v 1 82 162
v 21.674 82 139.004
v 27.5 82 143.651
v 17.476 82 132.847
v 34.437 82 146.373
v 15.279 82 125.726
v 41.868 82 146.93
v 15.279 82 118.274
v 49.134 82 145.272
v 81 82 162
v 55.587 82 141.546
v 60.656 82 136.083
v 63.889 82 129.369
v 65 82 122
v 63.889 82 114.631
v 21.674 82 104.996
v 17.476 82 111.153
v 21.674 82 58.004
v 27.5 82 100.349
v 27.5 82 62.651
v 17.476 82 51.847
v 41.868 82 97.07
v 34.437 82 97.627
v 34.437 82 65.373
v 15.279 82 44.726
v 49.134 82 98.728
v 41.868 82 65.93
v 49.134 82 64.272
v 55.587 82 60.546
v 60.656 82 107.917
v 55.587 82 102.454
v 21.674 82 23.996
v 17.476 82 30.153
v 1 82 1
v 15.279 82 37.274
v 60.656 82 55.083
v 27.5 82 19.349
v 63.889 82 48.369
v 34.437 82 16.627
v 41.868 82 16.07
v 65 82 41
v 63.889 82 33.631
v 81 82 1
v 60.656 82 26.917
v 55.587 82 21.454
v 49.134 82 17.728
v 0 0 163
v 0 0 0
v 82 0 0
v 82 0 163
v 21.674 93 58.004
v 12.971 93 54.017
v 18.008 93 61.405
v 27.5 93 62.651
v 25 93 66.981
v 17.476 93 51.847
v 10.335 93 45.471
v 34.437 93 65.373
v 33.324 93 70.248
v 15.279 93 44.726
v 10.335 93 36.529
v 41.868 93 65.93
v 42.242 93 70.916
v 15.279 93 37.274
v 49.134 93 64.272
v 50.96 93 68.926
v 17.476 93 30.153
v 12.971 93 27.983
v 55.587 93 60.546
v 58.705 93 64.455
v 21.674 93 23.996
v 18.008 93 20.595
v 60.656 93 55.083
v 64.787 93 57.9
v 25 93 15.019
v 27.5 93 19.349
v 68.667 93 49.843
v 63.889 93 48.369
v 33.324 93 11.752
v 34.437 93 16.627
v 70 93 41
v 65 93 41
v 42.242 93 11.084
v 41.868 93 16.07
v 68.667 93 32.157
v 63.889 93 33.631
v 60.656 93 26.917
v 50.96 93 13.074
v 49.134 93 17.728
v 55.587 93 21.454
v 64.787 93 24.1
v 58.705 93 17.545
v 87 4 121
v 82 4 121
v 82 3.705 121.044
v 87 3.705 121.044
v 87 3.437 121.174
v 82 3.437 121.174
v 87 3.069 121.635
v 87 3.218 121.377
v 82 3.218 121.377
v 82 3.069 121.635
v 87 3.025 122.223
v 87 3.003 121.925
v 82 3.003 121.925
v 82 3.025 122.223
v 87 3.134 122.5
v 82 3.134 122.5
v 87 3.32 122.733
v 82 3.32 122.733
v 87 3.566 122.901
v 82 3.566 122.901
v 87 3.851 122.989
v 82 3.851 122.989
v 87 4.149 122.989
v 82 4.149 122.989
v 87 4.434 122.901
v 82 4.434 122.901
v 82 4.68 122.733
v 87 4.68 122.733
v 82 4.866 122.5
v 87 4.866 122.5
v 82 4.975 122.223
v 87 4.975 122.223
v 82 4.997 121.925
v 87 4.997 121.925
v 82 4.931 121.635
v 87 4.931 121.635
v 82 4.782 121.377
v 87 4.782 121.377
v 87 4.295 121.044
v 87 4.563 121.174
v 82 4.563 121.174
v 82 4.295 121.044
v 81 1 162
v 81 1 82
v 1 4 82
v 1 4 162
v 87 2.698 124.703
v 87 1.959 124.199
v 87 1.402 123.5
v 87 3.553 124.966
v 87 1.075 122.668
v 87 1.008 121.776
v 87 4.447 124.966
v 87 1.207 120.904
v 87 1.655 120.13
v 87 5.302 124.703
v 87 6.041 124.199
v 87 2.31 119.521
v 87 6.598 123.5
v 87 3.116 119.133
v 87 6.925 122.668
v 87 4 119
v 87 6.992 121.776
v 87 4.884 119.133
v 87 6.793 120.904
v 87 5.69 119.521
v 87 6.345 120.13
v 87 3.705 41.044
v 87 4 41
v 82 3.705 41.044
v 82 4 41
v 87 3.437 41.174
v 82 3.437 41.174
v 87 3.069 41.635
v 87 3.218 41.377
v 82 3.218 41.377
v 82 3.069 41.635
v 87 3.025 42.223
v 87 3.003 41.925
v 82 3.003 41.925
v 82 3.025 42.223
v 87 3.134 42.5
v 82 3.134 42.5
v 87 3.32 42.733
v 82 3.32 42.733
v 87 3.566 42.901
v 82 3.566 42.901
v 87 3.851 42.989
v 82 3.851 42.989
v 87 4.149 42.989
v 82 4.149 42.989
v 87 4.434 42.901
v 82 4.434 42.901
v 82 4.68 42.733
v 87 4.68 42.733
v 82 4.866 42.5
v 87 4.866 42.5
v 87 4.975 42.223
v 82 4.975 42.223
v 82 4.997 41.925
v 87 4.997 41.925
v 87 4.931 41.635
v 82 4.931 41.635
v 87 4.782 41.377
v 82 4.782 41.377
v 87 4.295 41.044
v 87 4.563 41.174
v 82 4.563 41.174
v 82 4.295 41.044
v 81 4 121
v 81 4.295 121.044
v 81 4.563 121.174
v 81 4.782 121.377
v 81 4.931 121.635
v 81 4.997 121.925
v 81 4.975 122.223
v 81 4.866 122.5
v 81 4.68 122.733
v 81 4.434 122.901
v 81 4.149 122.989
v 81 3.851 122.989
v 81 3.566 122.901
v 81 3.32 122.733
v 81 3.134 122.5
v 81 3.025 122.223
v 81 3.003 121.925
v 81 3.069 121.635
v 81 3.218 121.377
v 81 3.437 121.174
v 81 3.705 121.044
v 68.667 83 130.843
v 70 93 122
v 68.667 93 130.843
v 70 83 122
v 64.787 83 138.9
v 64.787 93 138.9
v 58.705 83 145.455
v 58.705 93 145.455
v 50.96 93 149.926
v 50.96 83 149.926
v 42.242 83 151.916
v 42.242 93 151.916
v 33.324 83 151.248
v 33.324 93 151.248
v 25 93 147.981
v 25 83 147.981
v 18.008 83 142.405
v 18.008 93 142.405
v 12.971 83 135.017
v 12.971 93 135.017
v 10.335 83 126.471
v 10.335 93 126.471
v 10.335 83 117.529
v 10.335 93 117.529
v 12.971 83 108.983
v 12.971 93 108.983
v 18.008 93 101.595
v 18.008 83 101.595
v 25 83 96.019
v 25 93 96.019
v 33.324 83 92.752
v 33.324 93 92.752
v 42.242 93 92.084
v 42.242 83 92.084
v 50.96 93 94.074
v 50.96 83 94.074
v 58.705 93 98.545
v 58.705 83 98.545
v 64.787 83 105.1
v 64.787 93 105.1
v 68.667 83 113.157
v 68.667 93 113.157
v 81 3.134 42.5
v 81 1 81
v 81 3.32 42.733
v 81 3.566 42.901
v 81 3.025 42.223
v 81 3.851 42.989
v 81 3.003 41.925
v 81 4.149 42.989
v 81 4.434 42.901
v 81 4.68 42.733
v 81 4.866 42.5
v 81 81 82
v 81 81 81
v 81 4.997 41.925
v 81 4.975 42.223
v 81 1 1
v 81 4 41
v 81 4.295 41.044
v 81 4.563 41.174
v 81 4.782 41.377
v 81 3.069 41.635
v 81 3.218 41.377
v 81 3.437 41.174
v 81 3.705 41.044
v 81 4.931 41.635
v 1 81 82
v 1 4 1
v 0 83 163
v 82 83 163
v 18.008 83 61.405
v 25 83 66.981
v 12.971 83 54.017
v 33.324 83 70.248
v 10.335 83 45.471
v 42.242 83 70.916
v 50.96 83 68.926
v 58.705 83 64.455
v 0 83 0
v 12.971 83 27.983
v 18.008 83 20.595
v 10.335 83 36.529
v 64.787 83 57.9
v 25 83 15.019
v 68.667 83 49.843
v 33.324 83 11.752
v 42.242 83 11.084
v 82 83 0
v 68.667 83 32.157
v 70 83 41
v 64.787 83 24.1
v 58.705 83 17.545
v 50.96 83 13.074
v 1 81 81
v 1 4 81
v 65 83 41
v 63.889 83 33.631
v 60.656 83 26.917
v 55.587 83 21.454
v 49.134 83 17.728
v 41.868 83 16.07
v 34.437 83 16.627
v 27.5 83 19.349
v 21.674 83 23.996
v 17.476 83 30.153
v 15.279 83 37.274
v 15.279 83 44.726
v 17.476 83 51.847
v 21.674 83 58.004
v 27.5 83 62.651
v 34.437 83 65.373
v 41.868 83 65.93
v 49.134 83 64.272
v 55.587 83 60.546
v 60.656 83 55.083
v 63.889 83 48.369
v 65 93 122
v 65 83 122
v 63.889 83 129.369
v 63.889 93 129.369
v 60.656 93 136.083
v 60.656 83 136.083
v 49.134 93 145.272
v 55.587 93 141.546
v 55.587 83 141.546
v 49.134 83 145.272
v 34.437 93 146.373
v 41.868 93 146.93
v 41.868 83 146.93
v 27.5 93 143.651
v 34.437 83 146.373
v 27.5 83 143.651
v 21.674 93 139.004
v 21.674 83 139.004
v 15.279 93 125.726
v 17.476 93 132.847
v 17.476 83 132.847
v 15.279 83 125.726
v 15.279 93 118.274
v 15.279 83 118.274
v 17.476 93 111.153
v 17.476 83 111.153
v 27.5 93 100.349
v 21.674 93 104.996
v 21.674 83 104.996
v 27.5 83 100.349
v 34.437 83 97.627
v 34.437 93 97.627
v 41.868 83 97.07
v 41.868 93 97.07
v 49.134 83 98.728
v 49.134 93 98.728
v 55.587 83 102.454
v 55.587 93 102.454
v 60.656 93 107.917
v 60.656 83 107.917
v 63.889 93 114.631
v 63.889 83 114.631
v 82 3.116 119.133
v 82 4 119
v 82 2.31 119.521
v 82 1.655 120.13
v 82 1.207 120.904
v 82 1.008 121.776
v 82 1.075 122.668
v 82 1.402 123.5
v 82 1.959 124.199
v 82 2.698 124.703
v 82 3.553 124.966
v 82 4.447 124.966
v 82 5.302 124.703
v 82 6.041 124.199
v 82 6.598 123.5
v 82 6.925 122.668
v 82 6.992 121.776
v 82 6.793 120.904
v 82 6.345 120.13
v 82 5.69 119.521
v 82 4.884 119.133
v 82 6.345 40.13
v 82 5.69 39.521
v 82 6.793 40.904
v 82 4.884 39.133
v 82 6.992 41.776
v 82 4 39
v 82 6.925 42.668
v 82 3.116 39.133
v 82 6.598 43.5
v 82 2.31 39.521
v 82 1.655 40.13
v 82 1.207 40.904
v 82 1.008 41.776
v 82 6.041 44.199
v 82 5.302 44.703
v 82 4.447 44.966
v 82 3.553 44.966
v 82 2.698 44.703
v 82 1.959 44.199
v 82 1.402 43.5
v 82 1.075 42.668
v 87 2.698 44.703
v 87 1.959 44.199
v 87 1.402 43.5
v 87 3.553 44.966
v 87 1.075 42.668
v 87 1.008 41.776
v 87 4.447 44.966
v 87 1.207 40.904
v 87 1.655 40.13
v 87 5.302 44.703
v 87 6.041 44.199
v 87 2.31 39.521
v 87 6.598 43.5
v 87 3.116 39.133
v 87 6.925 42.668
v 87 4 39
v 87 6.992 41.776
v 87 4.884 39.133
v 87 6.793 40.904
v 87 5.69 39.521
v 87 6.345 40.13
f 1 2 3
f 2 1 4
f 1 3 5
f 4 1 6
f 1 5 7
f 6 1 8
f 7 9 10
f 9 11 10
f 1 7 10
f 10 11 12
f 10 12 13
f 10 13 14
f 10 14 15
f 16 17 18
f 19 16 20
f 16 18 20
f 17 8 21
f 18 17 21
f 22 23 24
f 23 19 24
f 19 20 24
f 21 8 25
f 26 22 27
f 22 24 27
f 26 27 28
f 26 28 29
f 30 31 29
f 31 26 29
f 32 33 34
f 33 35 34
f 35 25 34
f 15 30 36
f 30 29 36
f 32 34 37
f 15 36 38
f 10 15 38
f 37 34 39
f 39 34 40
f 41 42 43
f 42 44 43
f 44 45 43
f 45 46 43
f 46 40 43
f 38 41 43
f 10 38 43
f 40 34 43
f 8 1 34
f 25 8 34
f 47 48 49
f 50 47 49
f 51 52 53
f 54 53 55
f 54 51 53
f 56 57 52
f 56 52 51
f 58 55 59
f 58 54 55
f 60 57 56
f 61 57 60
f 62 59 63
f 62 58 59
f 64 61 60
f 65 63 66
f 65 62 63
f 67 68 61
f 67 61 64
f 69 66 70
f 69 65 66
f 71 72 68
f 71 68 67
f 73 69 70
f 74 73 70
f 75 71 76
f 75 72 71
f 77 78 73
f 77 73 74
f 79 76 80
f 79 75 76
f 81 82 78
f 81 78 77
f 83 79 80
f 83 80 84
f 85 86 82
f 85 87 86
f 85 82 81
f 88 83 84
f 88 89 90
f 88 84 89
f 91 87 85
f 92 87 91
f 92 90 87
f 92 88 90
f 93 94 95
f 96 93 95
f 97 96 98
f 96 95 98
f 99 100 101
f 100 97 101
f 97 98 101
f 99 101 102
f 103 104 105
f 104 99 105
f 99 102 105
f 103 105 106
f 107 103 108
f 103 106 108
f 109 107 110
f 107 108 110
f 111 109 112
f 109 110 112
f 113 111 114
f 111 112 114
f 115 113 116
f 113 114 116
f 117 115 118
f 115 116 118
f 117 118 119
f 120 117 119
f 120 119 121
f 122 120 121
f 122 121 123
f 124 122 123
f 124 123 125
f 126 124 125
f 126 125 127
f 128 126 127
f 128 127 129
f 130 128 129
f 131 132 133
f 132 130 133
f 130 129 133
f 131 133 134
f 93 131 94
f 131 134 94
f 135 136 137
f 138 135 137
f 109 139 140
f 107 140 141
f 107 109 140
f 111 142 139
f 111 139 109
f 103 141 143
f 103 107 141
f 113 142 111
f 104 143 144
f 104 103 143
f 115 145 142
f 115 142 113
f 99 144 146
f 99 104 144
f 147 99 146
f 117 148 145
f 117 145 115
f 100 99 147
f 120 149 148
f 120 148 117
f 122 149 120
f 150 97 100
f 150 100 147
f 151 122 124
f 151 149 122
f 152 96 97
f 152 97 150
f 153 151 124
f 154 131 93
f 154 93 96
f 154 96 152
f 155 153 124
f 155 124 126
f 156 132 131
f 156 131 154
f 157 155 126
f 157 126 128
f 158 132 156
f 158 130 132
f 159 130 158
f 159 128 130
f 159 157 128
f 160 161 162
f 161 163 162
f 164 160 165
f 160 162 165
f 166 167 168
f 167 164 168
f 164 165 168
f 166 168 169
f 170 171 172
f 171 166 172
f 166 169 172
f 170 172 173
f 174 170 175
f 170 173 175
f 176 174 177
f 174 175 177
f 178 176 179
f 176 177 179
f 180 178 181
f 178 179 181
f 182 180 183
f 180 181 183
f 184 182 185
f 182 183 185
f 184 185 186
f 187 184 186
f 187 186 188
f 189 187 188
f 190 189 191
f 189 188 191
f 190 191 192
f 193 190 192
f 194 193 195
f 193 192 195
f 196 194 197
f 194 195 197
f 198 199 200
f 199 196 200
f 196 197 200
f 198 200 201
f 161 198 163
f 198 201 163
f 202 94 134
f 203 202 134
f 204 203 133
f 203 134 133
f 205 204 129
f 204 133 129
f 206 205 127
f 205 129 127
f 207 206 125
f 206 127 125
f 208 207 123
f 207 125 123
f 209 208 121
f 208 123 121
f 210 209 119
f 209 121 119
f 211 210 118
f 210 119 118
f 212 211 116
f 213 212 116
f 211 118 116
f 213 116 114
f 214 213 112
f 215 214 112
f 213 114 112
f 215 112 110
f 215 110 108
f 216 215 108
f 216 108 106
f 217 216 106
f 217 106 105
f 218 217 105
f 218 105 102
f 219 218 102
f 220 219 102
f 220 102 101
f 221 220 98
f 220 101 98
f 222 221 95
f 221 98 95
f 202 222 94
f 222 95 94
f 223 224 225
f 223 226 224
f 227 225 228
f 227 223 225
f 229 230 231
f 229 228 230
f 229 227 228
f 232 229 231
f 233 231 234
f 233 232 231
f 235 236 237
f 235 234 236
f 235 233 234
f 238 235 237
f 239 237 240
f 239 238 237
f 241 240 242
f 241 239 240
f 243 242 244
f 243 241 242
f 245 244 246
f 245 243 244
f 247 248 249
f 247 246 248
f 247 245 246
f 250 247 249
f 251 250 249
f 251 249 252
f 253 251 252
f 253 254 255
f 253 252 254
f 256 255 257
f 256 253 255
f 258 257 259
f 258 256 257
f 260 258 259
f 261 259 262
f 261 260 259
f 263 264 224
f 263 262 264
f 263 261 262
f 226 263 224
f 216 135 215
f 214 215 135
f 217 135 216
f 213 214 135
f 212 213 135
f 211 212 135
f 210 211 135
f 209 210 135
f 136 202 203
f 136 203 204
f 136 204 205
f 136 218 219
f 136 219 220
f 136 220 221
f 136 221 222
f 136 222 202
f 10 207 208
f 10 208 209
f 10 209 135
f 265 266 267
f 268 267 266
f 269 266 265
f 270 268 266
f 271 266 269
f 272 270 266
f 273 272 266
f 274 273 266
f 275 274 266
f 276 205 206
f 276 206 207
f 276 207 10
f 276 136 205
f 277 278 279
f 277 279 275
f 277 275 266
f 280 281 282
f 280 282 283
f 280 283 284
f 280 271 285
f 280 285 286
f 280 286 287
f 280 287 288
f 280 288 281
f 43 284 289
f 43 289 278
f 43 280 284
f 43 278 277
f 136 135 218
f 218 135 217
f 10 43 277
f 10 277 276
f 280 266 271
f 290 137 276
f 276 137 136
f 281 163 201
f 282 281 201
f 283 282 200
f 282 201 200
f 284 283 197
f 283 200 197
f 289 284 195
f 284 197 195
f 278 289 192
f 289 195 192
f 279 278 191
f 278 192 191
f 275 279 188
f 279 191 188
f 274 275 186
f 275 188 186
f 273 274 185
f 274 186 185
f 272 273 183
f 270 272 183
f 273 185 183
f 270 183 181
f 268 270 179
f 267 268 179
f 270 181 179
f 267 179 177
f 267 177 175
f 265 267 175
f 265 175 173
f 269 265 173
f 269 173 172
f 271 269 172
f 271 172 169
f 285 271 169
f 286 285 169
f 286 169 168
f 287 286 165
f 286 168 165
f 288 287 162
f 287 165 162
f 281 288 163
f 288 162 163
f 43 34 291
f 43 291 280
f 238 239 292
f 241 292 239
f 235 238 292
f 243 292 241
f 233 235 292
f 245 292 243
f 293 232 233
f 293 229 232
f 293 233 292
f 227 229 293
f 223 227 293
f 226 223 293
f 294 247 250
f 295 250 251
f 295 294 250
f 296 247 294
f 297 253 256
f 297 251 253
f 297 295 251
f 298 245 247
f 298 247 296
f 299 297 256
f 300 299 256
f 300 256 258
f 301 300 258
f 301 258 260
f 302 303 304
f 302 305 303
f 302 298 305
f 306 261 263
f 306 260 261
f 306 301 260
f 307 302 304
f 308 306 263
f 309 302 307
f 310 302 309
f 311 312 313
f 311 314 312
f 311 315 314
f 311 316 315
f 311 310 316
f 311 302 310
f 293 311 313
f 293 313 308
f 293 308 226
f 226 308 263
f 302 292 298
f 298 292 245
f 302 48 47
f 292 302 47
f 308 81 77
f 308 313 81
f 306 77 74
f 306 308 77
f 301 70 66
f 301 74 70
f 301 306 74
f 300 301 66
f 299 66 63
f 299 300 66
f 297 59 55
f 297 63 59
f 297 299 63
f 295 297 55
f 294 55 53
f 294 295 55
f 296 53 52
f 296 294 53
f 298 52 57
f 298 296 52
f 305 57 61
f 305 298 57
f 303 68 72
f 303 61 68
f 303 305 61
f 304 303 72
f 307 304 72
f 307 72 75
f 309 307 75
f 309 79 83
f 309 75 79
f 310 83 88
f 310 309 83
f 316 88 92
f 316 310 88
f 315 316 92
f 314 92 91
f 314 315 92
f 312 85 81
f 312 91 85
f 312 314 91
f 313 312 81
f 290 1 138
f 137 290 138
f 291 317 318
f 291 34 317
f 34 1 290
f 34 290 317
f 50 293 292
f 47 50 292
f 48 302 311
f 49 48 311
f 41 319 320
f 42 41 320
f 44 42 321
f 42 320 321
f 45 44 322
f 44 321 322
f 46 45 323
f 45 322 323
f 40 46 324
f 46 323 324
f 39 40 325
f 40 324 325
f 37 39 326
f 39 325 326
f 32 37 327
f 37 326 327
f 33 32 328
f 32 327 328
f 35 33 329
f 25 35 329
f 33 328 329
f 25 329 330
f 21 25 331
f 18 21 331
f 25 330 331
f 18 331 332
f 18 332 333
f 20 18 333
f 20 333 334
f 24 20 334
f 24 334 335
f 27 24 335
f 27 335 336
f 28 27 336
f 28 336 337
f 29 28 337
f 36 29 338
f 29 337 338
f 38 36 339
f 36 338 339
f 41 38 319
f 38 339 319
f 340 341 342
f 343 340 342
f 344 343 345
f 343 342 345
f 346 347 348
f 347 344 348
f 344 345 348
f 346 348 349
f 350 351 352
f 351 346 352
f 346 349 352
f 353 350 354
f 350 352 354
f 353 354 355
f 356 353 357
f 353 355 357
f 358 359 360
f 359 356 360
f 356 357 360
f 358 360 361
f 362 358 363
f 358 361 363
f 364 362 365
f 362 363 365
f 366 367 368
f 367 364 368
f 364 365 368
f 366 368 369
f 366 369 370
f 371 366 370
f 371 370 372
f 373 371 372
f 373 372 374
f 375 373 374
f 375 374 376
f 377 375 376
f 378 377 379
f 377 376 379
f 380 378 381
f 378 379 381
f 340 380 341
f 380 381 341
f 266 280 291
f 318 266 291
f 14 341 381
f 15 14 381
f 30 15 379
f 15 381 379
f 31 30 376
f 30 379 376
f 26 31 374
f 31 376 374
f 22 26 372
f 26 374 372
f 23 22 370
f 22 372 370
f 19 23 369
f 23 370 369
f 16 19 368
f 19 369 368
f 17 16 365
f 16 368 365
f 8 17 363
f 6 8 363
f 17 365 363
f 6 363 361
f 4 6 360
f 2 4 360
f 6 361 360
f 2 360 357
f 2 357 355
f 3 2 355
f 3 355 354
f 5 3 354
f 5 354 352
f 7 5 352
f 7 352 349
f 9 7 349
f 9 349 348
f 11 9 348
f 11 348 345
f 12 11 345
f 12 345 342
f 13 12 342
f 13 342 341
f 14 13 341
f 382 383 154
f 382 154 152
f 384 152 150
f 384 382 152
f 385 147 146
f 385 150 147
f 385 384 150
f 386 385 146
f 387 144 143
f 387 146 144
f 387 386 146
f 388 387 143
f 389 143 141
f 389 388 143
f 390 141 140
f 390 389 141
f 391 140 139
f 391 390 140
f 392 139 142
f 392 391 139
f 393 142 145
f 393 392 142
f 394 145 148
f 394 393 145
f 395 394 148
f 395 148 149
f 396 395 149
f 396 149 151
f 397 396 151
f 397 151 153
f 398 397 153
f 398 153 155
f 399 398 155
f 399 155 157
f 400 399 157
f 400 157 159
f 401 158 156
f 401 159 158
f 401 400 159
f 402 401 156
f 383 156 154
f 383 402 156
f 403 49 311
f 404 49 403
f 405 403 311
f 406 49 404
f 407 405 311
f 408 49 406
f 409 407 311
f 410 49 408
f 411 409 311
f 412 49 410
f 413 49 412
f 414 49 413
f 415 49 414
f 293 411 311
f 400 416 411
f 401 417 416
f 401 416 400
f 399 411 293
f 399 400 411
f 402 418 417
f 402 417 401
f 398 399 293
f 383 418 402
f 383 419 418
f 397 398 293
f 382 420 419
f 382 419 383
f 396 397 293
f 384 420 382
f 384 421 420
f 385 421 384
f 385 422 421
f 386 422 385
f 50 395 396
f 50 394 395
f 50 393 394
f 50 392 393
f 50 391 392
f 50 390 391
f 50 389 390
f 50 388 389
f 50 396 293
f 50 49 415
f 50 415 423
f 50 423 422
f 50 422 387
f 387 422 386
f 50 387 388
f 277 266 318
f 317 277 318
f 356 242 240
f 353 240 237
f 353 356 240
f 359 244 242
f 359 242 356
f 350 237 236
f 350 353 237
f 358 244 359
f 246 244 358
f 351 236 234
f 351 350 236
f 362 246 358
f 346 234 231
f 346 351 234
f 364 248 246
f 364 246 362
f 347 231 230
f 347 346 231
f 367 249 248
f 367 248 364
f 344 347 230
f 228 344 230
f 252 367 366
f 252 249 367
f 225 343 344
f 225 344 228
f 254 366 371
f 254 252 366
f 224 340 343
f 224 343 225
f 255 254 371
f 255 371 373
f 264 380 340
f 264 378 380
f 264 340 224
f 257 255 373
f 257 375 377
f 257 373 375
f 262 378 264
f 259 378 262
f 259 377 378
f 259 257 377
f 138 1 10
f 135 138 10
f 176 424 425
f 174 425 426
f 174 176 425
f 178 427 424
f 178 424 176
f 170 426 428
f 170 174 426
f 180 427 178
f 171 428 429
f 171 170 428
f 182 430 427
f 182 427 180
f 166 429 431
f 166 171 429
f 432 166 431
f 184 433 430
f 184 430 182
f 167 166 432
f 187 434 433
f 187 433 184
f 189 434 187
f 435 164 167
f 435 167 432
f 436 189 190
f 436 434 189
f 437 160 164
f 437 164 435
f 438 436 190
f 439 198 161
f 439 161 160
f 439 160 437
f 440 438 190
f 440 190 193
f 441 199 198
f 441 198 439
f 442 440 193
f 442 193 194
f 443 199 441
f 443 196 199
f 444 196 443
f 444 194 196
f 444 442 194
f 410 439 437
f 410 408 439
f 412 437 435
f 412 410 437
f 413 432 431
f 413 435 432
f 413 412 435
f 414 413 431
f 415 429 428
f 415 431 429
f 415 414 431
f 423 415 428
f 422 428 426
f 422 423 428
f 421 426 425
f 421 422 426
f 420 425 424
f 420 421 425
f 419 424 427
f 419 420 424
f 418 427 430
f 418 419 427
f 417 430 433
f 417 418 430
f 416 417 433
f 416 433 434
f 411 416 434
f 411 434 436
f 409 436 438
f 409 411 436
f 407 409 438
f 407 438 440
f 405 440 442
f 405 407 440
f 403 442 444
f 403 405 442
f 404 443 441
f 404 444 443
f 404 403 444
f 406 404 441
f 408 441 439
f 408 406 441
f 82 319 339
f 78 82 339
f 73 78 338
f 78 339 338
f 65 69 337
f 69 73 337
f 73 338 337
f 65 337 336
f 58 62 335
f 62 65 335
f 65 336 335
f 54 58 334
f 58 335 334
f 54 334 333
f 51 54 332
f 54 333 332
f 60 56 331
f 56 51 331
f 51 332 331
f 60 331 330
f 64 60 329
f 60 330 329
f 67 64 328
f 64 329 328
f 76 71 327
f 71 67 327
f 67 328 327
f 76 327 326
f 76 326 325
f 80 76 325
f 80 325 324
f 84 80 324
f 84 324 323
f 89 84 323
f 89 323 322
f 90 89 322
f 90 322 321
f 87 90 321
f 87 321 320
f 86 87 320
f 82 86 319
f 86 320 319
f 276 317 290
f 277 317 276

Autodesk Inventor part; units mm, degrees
ref_plane "YZ Plane" through (0, 0, 0) normal (1, 0, 0) x (0, 1, 0)
ref_plane "XZ Plane" through (0, 0, 0) normal (0, 1, 0) x (-1, 0, 0)
ref_plane "XY Plane" through (0, 0, 0) normal (0, 0, 1) x (1, 0, 0)
sketch "Sketch1" plane through (0, 0, 0) normal (0, 0, 1) x (1, 0, 0)
  line L0 (0, 0) -> (82, 0)
  line L1 (82, 0) -> (82, 82)
  line L2 (82, 82) -> (0, 82)
  line L3 (0, 82) -> (0, 0)
  dimension "d0" = 82
  dimension "d1" = 82
extrude "Extrusion1" add sketch "Sketch1" along normal blind 163
shell "Shell1" thickness 1 removed faces 1 at (54.6667, 82, 54.3333)
sketch "Sketch6" plane through (82, 0, 0) normal (1, 0, 0) x (0, 0, -1)
  circle A0 centre (-122, 4) radius 1
  circle A1 centre (-122, 4) radius 3
  line L0 (0, 0) -> (0, 82) projected
  line L1 (0, 0) -> (-163, 0) projected
  line L2 (-163, 0) -> (-163, 82) projected
  dimension "d18" = 2
  dimension "d19" = 2
  dimension "d21" = 4
  dimension "d50" = 41
extrude "Extrusion5" add sketch "Sketch6" along normal blind 5
thread "Thread1" size "M6x1" class "6g" standard "ANSI Metric M Profile" length 7.15
sketch "Sketch7" plane through (82, 4, 122) normal (1, 0, 0) x (0, 0, -1)
  circle A0 centre (0, 0) radius 1 projected
  circle A1 centre (0, 0) radius 1
  point P0 (122, -4)
extrude "Extrusion6" cut sketch "Sketch7" against normal blind 5
sketch "Sketch8" plane through (0, 82, 0) normal (0, 1, 0) x (1, 0, 0)
  line L0 (0, 0) -> (0, -163) projected
  line L1 (82, 0) -> (82, -163) projected
  line L2 (0, 0) -> (82, 0)
  line L3 (82, 0) -> (82, -163)
  line L4 (82, -163) -> (0, -163)
  line L5 (0, -163) -> (0, 0)
  point P0 (0, -163)
extrude "Extrusion7" add sketch "Sketch8" along normal blind 1
sketch "Sketch9" plane through (0, 83, 0) normal (0, 1, 0) x (1, 0, 0)
  circle A0 centre (40, -122) radius 25
  circle A1 centre (40, -122) radius 30
  line L0 (0, 0) -> (0, -163) projected
  line L1 (0, -163) -> (82, -163) projected
  line L2 (1, -1) -> (1, -162) projected
  line L3 (1, -81.5) -> (81, -81.5)
  line L4 (81, -1) -> (81, -162) projected
  dimension "d30" = 50
  dimension "d31" = 40
  dimension "d32" = 41
  dimension "d33" = 5
extrude "Extrusion8" add sketch "Sketch9" along normal blind 10
sketch "Sketch10" plane through (40, 83, 122) normal (0, 1, 0) x (1, 0, 0)
  circle A0 centre (0, 0) radius 25
  point P0 (-40, 122)
extrude "Extrusion9" cut sketch "Sketch10" against normal blind 10
thread "Thread2" size "M50x4" class "6H" standard "ANSI Metric M Profile" length 7.15
sketch "Sketch12" plane through (1, 1, 1) normal (0, 1, 0) x (1, 0, 0)
  line L0 (0, 0) -> (0, -161) projected
  line L1 (0, -81) -> (80, -81)
  line L2 (80, -81) -> (80, -80)
  line L3 (80, -80) -> (0, -80)
  line L4 (0, -80) -> (0, -81)
  line L5 (80, 0) -> (80, -161) projected
  line L6 (0, -161) -> (80, -161) projected
  point P0 (-1, 1)
  point P1 (0, -80)
  dimension "d44" = 1
  dimension "d45" = 80
extrude "Extrusion11" add sketch "Sketch12" along normal blind 80 contours L3 L2 L1 L0
sketch "Sketch3" plane through (1, 82, 1) normal (0, 0, 1) x (1, 0, 0)
  line L0 (0, -81) -> (80, -81)
  line L1 (80, -81) -> (0, -78)
  line L2 (0, -78) -> (0, -81)
  point P0 (-1, -82)
  dimension "d5" = 3
extrude "Extrusion12" add sketch "Sketch3" along normal up to surface (161 mm away)
pattern_linear "Rectangular Pattern1" count 2 spacing 81 along (0, 0, -1) of "Extrusion8", "Extrusion9"
pattern_linear "Rectangular Pattern3" count 2 spacing 80 along (0, 0, -1) of "Extrusion5", "Extrusion6"
properties part number "BoxChem"
